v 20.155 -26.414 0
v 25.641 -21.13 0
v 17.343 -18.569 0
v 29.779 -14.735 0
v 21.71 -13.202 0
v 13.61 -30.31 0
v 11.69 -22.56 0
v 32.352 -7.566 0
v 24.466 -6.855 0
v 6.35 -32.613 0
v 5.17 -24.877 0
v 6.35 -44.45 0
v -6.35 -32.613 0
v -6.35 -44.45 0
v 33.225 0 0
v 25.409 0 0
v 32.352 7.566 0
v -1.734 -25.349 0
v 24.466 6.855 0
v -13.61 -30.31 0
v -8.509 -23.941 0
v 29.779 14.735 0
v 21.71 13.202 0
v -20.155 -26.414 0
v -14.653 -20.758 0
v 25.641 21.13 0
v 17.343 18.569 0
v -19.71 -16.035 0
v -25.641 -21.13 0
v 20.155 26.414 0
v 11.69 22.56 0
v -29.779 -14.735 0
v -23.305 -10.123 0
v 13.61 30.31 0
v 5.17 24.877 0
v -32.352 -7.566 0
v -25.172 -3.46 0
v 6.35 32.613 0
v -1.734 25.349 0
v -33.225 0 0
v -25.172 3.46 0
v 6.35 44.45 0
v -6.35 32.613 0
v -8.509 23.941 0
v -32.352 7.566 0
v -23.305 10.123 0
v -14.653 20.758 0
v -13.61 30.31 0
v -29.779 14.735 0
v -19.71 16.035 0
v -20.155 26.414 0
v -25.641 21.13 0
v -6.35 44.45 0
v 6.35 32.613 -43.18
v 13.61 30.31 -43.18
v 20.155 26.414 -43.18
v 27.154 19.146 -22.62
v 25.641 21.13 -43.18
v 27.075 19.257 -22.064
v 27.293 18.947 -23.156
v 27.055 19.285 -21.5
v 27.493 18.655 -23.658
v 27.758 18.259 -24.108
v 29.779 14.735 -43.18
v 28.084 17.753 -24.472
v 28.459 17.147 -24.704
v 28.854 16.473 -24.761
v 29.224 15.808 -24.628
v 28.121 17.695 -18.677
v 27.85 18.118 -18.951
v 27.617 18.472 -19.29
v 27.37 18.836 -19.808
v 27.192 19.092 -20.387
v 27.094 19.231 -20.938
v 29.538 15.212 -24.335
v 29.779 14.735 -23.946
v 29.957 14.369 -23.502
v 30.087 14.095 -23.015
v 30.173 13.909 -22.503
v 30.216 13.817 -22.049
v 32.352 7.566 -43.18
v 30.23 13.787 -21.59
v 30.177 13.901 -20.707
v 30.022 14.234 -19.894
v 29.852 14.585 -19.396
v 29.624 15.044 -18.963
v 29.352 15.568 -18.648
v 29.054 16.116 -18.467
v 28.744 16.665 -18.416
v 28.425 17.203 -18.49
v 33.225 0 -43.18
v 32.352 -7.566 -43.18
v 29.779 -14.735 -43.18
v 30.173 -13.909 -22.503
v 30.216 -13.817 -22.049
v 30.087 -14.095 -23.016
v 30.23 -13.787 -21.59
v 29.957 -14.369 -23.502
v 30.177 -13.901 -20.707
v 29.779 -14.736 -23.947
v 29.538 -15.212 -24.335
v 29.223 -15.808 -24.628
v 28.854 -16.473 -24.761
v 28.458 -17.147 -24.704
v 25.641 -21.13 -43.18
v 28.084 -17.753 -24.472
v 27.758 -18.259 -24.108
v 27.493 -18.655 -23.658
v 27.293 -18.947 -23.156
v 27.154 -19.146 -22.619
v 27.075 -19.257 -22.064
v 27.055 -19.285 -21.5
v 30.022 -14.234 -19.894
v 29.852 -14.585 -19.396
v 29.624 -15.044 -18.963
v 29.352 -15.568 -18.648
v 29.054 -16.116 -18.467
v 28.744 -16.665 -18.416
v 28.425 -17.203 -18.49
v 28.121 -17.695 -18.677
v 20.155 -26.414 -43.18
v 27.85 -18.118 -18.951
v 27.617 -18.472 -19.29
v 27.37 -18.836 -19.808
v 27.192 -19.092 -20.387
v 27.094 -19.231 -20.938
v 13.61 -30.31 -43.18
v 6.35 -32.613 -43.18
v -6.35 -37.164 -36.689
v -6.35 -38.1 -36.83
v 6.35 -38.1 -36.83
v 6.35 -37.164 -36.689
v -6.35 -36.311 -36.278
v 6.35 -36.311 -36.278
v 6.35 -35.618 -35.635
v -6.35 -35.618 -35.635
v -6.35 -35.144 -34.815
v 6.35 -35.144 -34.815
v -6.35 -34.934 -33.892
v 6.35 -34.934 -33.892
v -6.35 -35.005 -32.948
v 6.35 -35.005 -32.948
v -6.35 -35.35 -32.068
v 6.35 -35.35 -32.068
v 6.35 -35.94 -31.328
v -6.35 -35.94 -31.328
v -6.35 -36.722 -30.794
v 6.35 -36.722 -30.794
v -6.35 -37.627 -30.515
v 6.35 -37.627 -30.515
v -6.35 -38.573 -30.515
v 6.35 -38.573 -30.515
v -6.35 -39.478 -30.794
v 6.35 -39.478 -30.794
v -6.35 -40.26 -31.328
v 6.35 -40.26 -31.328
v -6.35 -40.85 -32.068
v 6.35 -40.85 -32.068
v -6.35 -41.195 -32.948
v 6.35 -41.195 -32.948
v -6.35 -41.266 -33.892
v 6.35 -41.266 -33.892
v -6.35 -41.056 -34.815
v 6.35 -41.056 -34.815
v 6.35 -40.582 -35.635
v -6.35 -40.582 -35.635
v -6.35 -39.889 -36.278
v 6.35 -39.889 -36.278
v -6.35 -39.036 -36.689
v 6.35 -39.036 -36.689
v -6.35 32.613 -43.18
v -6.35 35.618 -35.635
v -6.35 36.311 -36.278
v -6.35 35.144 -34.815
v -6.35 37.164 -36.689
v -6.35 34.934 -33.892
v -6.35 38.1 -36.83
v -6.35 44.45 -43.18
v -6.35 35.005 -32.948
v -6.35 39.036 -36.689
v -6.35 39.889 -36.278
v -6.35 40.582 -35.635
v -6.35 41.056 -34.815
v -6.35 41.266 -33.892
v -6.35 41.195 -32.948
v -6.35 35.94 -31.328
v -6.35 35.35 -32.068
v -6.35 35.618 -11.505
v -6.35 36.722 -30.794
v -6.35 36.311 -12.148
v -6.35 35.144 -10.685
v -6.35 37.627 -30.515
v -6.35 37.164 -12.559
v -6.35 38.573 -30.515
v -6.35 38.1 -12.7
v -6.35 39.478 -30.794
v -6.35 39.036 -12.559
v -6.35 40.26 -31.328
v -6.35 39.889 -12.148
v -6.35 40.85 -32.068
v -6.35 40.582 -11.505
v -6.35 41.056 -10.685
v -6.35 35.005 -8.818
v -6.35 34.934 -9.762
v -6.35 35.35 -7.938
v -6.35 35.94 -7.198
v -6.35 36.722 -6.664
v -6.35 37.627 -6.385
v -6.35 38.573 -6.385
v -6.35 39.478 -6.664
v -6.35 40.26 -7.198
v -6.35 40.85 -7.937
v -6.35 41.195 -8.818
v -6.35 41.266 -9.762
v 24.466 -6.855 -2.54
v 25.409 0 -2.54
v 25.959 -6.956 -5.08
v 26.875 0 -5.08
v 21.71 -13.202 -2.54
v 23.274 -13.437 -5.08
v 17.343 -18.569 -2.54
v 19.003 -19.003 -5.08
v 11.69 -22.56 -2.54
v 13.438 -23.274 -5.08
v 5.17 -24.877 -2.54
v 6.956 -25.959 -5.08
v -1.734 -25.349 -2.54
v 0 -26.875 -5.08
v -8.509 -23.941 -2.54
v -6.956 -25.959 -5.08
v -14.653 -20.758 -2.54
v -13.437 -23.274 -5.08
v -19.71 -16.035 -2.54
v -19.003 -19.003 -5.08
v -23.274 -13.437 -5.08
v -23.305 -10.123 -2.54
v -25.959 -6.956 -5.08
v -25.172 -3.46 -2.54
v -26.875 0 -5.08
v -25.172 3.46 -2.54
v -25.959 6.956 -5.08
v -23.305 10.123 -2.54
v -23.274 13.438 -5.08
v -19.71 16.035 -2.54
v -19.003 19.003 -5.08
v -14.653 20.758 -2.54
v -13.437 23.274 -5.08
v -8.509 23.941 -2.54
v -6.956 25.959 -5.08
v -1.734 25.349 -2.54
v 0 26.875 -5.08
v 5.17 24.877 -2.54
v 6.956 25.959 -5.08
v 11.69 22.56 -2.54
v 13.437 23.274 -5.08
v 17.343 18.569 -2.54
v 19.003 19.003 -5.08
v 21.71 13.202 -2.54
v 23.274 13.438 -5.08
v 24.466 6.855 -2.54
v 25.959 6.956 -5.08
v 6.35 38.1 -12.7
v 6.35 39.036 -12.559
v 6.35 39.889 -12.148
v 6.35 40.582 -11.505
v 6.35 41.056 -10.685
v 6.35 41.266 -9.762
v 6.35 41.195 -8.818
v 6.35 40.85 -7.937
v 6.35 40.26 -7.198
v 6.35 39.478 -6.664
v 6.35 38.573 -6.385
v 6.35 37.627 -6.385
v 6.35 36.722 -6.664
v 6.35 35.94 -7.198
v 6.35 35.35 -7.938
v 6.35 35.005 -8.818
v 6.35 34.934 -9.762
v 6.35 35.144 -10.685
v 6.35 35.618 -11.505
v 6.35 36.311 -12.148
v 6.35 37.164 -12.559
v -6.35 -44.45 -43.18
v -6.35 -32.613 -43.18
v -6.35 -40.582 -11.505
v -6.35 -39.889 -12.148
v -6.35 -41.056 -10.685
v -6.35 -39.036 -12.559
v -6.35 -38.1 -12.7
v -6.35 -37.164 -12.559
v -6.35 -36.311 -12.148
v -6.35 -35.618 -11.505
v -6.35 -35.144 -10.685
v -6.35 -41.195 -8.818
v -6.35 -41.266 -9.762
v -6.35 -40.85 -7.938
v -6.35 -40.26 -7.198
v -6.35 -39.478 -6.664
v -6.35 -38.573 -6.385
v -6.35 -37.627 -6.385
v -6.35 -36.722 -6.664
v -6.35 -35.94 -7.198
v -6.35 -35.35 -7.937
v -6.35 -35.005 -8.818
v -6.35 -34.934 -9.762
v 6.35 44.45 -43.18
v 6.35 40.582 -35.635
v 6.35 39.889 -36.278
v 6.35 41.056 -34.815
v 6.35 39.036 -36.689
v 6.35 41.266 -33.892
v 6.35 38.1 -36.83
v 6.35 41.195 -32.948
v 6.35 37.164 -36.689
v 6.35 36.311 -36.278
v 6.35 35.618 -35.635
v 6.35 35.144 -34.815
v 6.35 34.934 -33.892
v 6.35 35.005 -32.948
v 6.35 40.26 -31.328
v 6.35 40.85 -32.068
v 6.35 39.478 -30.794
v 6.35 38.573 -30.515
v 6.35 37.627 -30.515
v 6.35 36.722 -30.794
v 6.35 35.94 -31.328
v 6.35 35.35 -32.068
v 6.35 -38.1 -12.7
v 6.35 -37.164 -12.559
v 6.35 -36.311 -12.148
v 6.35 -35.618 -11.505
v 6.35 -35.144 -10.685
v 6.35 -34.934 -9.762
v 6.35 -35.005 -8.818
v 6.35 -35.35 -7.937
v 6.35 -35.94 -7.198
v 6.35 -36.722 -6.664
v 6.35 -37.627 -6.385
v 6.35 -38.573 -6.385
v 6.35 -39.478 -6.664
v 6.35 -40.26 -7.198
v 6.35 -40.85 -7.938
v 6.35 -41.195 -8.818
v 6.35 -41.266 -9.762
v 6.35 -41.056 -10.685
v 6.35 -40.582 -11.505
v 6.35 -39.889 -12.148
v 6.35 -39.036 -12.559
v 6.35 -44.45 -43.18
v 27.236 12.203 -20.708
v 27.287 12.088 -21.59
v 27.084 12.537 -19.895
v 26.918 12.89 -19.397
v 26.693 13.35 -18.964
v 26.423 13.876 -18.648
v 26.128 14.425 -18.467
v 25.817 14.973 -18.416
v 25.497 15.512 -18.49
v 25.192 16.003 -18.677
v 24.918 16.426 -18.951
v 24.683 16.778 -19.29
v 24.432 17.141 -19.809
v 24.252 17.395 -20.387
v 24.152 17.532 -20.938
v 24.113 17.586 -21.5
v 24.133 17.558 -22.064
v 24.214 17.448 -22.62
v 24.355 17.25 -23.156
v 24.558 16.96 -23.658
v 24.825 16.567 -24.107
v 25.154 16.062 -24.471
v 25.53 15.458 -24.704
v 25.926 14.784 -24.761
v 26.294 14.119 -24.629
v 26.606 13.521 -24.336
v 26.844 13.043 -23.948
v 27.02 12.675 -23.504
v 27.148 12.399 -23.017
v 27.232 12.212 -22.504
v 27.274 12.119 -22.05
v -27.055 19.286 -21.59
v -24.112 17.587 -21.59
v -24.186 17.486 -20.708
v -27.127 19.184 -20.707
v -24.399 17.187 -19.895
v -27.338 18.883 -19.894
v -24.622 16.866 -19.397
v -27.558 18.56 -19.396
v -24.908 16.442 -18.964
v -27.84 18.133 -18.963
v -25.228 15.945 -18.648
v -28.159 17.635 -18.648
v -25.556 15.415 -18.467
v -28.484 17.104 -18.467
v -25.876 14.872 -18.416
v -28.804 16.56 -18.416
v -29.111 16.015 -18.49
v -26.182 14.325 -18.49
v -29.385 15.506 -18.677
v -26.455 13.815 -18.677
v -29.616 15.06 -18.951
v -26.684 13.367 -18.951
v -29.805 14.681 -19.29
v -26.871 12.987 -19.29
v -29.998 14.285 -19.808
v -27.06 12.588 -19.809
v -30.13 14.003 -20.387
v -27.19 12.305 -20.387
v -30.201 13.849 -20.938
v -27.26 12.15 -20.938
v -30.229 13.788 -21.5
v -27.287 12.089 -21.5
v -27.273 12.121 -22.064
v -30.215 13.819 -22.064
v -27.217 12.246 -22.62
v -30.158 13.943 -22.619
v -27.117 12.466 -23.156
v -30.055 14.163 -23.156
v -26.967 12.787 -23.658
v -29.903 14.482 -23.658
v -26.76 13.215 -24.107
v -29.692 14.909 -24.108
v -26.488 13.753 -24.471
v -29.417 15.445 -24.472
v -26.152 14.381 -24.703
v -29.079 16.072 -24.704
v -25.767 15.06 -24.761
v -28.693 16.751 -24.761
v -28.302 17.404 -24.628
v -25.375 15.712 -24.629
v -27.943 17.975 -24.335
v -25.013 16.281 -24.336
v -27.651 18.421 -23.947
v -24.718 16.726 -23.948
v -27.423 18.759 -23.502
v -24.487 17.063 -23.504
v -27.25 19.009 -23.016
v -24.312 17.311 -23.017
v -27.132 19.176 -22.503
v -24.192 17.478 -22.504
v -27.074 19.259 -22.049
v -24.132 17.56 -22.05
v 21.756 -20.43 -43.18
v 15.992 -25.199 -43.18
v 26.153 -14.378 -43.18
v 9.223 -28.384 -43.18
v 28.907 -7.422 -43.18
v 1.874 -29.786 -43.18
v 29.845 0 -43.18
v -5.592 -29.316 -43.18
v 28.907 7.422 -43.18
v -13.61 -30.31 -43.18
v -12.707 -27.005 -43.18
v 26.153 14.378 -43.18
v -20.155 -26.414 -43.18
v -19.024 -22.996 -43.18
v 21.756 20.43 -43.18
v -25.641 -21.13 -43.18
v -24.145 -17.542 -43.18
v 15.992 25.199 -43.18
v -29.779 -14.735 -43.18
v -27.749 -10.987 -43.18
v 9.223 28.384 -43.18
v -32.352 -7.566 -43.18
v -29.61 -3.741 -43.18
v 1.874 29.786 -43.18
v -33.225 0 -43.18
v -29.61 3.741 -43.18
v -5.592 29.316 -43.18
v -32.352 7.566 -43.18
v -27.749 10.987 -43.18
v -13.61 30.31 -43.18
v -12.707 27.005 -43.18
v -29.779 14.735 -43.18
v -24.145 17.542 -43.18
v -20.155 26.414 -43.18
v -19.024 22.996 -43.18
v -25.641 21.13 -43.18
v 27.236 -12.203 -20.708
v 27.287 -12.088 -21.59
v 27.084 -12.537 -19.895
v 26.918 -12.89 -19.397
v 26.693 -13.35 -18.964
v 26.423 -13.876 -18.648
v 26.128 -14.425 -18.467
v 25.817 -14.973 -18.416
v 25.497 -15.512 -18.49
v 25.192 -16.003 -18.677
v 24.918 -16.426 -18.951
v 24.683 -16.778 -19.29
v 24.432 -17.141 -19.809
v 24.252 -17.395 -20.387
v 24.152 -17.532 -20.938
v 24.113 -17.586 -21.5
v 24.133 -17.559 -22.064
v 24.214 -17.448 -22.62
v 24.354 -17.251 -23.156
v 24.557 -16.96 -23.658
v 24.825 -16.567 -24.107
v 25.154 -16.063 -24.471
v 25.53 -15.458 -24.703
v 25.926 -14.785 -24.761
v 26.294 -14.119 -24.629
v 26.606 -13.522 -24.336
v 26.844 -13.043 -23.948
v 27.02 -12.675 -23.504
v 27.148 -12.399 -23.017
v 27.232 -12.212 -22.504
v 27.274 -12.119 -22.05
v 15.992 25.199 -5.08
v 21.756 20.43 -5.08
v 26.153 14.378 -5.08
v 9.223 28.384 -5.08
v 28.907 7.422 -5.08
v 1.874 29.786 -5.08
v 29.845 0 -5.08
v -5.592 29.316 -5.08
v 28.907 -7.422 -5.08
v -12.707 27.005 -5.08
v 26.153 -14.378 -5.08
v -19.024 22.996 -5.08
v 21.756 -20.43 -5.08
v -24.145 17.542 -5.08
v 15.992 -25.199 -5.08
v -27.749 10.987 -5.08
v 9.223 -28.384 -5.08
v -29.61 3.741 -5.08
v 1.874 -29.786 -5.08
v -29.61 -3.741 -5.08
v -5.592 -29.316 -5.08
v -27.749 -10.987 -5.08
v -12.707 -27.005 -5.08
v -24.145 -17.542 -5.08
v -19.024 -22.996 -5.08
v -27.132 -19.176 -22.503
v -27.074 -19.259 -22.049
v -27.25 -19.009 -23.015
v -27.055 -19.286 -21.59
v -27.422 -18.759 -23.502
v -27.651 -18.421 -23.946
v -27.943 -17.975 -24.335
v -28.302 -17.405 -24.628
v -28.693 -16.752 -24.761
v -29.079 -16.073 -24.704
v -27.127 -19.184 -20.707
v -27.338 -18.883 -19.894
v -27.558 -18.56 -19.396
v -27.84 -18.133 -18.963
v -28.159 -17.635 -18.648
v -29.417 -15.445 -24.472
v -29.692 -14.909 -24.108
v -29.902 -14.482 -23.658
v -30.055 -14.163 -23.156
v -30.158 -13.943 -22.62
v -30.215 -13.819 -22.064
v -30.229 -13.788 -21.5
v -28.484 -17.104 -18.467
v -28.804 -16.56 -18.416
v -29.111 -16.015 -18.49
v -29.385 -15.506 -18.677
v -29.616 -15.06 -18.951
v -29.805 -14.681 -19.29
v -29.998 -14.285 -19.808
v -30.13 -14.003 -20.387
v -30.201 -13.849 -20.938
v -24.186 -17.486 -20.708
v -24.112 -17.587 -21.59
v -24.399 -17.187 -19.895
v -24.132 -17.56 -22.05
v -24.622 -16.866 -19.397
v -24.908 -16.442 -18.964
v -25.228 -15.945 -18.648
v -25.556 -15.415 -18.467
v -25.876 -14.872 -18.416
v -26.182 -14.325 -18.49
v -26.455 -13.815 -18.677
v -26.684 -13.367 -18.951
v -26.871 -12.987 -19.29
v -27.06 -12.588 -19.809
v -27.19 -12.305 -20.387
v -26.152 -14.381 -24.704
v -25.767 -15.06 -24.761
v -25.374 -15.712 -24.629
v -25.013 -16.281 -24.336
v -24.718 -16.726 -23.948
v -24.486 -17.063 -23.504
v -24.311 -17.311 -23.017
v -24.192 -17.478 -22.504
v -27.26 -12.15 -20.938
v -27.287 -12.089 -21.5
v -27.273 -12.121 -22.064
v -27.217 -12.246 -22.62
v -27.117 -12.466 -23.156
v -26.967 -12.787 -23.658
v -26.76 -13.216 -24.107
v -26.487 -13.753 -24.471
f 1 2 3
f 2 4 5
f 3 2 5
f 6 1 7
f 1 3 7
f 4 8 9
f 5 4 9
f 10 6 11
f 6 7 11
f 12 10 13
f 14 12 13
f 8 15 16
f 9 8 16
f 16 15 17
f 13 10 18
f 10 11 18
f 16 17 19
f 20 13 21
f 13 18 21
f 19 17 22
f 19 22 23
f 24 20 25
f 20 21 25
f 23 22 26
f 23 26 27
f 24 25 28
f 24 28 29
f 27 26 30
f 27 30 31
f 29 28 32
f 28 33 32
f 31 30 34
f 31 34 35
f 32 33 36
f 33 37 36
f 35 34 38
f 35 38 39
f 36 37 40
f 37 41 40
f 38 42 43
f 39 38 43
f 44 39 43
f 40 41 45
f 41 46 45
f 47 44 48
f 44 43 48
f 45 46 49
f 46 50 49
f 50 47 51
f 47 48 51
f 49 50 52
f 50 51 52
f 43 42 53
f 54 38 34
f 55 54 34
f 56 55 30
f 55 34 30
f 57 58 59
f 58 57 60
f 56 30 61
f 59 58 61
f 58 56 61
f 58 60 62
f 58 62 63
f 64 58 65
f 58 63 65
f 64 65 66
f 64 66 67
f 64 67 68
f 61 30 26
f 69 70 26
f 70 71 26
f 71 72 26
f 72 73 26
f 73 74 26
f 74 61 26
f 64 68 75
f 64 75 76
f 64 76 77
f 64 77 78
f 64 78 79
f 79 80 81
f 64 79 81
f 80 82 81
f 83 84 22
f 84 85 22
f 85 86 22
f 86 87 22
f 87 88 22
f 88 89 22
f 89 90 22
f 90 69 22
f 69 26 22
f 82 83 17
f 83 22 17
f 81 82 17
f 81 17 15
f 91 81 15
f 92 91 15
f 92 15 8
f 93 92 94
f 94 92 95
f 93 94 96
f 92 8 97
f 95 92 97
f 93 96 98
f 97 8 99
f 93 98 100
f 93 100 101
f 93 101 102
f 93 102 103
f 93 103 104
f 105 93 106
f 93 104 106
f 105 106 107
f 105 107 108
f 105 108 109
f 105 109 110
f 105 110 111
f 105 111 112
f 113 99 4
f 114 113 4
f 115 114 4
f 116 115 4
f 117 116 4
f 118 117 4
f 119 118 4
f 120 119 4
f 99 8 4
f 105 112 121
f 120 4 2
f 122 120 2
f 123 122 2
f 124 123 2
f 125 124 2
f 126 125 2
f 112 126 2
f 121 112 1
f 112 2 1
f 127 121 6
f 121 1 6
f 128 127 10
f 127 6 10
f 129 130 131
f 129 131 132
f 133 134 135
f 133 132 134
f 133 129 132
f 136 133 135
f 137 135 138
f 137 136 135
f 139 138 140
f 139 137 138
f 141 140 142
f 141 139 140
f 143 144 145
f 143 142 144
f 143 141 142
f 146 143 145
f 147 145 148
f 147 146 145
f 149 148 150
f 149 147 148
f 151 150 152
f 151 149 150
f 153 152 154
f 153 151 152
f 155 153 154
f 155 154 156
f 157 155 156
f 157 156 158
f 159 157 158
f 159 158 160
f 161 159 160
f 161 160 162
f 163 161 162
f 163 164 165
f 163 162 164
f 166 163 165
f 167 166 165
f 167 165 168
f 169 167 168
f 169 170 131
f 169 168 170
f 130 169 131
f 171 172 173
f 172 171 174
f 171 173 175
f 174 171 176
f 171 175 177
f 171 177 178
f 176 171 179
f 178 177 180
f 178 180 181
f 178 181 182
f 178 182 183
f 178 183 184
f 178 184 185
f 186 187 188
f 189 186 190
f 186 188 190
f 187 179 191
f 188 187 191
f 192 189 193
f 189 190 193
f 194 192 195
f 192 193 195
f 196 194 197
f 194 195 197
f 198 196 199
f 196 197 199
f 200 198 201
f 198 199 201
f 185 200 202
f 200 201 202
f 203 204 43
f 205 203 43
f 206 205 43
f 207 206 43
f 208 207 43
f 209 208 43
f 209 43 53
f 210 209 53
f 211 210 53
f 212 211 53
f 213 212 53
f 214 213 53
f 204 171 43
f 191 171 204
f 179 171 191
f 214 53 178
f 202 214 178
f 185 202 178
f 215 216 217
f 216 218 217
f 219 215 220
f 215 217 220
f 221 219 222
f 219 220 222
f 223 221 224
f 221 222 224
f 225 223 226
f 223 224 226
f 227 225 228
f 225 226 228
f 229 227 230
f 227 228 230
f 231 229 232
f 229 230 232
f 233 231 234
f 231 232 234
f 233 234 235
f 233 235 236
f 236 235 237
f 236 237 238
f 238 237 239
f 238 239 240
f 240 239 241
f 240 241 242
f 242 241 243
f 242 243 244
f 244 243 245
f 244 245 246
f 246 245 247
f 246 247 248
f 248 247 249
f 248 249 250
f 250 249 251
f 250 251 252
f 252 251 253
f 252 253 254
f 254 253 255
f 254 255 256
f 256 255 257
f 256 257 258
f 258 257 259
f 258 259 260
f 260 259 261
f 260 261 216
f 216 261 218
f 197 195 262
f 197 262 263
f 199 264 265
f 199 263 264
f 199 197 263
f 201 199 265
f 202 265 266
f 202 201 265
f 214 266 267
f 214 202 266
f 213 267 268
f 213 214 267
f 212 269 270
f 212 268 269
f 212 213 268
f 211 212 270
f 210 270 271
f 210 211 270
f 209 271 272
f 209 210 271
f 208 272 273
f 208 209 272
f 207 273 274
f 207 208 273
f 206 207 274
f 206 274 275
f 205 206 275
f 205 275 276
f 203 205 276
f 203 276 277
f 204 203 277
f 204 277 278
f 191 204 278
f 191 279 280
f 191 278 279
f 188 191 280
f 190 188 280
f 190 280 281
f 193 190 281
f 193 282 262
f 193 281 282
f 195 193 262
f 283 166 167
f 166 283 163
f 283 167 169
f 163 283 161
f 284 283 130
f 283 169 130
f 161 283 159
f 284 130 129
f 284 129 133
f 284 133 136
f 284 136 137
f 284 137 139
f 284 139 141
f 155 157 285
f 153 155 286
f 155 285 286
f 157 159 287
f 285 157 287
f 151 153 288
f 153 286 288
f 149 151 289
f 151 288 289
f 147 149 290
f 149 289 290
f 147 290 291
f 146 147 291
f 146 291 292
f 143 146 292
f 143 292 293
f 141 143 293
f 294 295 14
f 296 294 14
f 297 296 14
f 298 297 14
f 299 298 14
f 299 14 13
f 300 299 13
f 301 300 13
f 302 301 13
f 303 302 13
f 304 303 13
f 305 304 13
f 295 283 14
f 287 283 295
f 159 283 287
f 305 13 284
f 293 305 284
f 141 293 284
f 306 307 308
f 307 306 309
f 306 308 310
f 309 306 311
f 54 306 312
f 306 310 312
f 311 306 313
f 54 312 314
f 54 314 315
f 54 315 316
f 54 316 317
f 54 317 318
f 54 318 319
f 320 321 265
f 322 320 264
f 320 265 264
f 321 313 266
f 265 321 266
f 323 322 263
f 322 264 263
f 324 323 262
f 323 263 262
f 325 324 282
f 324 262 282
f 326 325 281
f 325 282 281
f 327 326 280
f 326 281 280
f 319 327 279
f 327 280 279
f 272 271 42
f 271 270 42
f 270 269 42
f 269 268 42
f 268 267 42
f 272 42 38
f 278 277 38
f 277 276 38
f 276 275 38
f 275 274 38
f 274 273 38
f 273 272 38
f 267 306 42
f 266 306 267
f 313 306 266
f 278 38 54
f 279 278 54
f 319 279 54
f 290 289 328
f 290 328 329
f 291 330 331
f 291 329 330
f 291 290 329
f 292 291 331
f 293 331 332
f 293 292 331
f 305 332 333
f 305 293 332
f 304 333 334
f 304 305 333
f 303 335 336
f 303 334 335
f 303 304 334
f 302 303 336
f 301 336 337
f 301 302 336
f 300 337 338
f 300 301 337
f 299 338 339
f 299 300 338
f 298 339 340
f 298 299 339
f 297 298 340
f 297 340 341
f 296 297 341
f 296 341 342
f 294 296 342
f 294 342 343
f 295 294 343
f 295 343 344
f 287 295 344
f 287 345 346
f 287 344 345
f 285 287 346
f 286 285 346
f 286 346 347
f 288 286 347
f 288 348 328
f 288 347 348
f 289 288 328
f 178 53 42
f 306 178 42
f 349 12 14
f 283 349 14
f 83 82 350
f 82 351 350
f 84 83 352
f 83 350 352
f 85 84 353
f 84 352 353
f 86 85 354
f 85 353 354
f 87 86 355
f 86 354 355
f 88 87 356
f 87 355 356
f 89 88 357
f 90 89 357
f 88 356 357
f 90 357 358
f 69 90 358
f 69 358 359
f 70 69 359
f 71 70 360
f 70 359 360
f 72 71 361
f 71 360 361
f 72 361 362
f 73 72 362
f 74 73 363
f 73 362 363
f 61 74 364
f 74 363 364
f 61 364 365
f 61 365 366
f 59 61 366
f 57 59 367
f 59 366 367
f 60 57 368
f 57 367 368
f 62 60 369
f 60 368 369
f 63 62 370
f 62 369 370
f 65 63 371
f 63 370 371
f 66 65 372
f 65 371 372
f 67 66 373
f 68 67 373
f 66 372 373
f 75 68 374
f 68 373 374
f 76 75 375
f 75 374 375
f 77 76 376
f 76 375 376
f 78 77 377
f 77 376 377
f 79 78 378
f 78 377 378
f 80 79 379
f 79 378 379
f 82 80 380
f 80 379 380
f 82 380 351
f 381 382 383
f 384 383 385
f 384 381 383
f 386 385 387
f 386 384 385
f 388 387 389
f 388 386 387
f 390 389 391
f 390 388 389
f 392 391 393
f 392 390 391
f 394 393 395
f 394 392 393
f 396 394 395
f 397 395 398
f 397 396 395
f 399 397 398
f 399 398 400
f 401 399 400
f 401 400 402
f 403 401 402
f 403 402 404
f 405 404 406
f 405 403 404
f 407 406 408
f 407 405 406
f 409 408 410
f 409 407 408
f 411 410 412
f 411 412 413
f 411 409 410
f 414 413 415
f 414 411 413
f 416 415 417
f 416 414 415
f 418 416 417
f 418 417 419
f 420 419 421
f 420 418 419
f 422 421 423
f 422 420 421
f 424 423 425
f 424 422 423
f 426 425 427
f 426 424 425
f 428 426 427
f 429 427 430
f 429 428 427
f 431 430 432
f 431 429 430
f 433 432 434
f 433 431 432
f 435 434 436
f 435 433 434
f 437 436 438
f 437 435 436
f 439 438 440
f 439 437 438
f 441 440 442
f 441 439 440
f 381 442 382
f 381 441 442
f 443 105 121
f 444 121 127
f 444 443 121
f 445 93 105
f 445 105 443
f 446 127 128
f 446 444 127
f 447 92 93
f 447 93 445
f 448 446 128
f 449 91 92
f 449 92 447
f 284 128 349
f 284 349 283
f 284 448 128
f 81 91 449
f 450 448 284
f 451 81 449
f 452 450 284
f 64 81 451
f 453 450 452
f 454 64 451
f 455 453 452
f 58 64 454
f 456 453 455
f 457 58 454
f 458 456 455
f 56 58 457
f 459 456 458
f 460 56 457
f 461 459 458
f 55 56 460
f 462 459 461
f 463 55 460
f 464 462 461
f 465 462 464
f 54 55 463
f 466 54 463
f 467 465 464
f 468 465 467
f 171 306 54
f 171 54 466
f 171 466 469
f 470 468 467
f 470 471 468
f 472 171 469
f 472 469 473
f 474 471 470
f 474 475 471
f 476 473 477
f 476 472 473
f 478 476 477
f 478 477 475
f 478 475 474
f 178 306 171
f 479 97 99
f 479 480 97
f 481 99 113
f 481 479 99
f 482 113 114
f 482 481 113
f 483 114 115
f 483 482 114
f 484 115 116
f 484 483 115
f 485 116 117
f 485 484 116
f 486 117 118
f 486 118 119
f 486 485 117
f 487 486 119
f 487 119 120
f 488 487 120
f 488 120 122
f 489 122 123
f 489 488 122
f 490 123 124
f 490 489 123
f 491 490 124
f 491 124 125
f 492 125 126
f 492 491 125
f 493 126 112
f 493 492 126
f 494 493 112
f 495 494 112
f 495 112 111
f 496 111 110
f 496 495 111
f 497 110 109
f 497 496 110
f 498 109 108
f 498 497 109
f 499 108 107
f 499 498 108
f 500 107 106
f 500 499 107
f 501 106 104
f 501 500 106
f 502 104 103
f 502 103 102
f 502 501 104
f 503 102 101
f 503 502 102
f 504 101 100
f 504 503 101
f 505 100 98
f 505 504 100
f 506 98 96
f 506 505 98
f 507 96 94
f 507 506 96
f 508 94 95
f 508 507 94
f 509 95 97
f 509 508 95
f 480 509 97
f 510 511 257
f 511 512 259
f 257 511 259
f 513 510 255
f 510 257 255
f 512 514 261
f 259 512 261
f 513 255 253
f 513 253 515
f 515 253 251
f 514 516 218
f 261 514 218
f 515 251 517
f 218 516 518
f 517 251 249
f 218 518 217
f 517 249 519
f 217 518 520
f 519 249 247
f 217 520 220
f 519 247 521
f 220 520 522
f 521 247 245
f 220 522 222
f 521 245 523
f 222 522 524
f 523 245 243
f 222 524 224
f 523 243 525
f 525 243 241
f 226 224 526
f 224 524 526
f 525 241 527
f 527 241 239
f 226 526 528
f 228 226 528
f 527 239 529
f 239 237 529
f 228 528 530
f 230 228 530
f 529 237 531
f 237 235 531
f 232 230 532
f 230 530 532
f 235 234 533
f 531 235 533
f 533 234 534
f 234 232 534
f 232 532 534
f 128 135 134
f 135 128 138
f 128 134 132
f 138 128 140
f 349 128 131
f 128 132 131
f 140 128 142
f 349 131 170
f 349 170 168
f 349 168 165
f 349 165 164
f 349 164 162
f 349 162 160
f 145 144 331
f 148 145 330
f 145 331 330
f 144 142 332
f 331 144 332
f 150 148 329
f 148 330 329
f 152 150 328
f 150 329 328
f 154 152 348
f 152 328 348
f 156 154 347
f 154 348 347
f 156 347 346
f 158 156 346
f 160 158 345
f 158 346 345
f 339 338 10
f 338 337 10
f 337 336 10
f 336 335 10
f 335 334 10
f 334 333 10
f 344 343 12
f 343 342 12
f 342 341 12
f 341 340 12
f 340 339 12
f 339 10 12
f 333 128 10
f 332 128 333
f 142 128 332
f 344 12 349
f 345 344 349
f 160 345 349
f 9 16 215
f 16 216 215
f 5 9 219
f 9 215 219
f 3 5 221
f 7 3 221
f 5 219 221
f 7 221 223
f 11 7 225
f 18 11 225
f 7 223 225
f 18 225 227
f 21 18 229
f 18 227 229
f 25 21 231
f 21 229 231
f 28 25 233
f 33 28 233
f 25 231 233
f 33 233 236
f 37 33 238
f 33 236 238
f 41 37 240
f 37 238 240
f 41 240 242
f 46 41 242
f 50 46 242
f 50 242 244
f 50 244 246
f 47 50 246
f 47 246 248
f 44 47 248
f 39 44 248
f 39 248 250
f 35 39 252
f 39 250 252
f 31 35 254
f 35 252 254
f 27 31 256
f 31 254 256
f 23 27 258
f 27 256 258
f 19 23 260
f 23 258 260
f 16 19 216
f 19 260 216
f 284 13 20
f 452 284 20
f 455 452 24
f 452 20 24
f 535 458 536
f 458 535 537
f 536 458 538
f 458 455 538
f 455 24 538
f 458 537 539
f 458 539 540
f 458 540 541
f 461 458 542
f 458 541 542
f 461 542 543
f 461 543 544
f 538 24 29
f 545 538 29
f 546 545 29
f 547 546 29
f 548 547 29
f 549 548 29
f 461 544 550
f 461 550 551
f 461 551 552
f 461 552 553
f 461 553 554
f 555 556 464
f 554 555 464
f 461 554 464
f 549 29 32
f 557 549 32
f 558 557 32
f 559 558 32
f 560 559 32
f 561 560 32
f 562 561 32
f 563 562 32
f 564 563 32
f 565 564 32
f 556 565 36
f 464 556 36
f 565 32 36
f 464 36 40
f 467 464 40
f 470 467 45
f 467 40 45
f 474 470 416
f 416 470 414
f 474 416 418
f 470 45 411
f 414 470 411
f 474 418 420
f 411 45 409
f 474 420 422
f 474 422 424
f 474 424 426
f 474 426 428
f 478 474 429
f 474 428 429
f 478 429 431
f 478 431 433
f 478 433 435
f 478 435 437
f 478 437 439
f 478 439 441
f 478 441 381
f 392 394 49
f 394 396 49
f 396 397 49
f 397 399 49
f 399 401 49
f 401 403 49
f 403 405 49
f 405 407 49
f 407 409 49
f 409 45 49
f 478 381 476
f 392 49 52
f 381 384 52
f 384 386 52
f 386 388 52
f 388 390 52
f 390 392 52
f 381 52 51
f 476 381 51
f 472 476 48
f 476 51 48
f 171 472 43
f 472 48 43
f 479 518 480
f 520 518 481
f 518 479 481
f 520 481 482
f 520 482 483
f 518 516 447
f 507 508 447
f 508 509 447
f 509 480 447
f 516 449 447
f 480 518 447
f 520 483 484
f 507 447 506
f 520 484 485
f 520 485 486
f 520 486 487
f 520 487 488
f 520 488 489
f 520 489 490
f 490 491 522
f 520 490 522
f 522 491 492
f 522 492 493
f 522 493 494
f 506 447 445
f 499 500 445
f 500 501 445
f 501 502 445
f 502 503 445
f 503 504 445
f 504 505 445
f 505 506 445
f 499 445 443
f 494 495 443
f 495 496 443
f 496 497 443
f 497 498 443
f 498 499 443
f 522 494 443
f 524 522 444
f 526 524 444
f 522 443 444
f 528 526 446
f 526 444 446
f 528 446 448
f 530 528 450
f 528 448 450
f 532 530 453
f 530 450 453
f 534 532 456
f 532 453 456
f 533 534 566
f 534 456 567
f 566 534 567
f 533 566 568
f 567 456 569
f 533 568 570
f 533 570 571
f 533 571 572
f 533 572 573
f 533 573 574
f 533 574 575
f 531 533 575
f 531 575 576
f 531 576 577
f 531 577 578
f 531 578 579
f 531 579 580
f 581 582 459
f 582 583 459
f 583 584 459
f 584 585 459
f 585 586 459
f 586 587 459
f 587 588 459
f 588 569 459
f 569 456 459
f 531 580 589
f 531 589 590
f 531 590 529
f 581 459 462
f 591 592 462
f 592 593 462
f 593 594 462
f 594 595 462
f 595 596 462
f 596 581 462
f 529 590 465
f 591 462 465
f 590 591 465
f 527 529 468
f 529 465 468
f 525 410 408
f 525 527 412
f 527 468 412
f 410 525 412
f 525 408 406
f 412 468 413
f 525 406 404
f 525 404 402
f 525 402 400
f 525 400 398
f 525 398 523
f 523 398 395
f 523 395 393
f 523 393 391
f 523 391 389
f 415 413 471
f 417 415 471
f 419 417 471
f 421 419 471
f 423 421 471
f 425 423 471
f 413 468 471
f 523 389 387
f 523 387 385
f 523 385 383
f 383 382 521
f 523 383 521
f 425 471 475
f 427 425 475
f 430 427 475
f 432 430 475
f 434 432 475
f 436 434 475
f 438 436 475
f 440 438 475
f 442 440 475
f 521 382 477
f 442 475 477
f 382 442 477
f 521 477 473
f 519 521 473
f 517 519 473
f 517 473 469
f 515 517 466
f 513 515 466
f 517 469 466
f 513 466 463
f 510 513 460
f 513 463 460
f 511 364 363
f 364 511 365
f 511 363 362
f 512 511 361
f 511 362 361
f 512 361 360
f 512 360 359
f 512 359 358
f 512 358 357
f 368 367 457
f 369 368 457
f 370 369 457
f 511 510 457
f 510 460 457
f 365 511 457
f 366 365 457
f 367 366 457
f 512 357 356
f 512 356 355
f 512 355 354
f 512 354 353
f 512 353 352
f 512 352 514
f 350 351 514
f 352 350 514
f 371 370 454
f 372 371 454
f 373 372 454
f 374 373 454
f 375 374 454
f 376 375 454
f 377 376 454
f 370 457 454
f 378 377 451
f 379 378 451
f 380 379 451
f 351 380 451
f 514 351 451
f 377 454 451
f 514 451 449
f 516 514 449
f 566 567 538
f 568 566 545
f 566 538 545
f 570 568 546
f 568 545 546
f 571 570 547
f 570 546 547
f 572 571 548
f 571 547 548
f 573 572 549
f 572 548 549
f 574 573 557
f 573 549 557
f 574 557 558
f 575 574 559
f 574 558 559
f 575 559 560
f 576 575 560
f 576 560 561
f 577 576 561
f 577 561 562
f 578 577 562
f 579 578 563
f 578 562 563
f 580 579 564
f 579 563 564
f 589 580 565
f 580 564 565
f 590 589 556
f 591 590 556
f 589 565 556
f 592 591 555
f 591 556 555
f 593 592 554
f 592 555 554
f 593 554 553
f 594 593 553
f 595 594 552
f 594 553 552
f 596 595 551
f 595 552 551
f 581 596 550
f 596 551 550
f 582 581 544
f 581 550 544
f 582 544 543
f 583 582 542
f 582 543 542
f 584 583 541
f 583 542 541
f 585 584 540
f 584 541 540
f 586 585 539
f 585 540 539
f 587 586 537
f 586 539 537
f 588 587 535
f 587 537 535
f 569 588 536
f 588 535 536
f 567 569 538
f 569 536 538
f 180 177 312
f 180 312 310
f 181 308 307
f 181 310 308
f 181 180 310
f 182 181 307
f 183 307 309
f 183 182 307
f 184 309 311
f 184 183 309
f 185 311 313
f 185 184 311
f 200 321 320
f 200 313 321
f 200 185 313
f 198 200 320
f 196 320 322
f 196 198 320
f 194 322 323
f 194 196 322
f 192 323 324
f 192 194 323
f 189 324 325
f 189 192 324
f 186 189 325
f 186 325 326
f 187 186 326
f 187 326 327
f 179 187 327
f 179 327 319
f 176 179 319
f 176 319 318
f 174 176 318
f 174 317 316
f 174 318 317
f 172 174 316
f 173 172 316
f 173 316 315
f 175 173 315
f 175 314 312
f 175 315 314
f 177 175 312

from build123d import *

# Parameters (mm, degrees)
SKETCH8_W               = 3.38
SKETCH8_H               = 38.1
BOSS_EXTRUDE10_DEPTH    = 43.18
CUT_EXTRUDE7_DEPTH      = 71.315115907
CUT_EXTRUDE7_DEPTH_BACK = 71.315115907
SKETCH18_R              = 3.175
SKETCH23_R              = 3.175
CUT_EXTRUDE9_DEPTH      = 71.315115907


with BuildPart() as part:
    # Sketch2 → Revolve1 (revolve)
    with BuildSketch(Plane(origin=(0, 0, 0), x_dir=(1, 0, 0), z_dir=(0, 1, 0))):
        Polygon((25.408530316, 0), (25.408530316, 2.54), (26.875, 5.08), (33.225, 5.08), (33.225, 0), align=None)
    revolve(axis=Axis((0, 0, 0), (0, 0, -1)))

    # Sketch8 → Revolve2 (revolve)
    with BuildSketch(Plane(origin=(0, 0, 0), x_dir=(1, 0, 0), z_dir=(0, 1, 0)), mode=Mode.PRIVATE) as revolve2_sk:
        with Locations((-31.535, 24.13)):
            Rectangle(SKETCH8_W, SKETCH8_H)
    revolve(revolve2_sk.sketch.rotate(Axis((0, 0, 0), (0, 0, -1)), 180), axis=Axis((0, 0, 0), (0, 0, -1)))

    # Sketch19 → Boss-Extrude10 (add)
    with BuildSketch(Plane.XY):
        with BuildLine():
            Line((-6.35, 32.612545515), (-6.35, 44.45))
            Line((-6.35, 44.45), (6.35, 44.45))
            Line((6.35, 44.45), (6.35, 32.612545515))
            ThreePointArc((6.35, 32.612545515), (0, 33.225), (-6.35, 32.612545515))
        make_face()
        with BuildLine():
            Line((6.35, -44.45), (-6.35, -44.45))
            Line((-6.35, -44.45), (-6.35, -32.612545515))
            ThreePointArc((-6.35, -32.612545515), (0, -33.225), (6.35, -32.612545515))
            Line((6.35, -32.612545515), (6.35, -44.45))
        make_face()
    extrude(amount=-BOSS_EXTRUDE10_DEPTH)

    # Sketch18 → Cut-Extrude7 (cut, two sides: drawn at the far end of the back side and taken through both)
    with BuildSketch(Plane(origin=(0, 0, 0), x_dir=(0, 0, -1), z_dir=(1, 0, 0)).offset(-CUT_EXTRUDE7_DEPTH_BACK)):
        with Locations((9.525, 38.1)):
            Circle(SKETCH18_R)
        with Locations((33.655, 38.1)):
            Circle(SKETCH18_R)
        with Locations((9.525, -38.1)):
            Circle(SKETCH18_R)
        with Locations((33.655, -38.1)):
            Circle(SKETCH18_R)
    extrude(amount=CUT_EXTRUDE7_DEPTH + CUT_EXTRUDE7_DEPTH_BACK, mode=Mode.SUBTRACT)

    # Sketch23 → Cut-Extrude9 (cut, symmetric)
    with BuildSketch(Plane(origin=(0, 0, 0), x_dir=(-0.5000000000000014, 0.8660254037844378, 0), z_dir=(-0.8660254037844378, -0.5000000000000014, 0))):
        with Locations(Location((0, 21.59, 0), (0, 0, 180))):
            Circle(SKETCH23_R)
    cut_extrude9 = extrude(amount=CUT_EXTRUDE9_DEPTH, both=True, mode=Mode.SUBTRACT)

    # Mirror3: Cut-Extrude9 across plane
    add(cut_extrude9.mirror(Plane.ZX), mode=Mode.SUBTRACT)


solid = part.part
